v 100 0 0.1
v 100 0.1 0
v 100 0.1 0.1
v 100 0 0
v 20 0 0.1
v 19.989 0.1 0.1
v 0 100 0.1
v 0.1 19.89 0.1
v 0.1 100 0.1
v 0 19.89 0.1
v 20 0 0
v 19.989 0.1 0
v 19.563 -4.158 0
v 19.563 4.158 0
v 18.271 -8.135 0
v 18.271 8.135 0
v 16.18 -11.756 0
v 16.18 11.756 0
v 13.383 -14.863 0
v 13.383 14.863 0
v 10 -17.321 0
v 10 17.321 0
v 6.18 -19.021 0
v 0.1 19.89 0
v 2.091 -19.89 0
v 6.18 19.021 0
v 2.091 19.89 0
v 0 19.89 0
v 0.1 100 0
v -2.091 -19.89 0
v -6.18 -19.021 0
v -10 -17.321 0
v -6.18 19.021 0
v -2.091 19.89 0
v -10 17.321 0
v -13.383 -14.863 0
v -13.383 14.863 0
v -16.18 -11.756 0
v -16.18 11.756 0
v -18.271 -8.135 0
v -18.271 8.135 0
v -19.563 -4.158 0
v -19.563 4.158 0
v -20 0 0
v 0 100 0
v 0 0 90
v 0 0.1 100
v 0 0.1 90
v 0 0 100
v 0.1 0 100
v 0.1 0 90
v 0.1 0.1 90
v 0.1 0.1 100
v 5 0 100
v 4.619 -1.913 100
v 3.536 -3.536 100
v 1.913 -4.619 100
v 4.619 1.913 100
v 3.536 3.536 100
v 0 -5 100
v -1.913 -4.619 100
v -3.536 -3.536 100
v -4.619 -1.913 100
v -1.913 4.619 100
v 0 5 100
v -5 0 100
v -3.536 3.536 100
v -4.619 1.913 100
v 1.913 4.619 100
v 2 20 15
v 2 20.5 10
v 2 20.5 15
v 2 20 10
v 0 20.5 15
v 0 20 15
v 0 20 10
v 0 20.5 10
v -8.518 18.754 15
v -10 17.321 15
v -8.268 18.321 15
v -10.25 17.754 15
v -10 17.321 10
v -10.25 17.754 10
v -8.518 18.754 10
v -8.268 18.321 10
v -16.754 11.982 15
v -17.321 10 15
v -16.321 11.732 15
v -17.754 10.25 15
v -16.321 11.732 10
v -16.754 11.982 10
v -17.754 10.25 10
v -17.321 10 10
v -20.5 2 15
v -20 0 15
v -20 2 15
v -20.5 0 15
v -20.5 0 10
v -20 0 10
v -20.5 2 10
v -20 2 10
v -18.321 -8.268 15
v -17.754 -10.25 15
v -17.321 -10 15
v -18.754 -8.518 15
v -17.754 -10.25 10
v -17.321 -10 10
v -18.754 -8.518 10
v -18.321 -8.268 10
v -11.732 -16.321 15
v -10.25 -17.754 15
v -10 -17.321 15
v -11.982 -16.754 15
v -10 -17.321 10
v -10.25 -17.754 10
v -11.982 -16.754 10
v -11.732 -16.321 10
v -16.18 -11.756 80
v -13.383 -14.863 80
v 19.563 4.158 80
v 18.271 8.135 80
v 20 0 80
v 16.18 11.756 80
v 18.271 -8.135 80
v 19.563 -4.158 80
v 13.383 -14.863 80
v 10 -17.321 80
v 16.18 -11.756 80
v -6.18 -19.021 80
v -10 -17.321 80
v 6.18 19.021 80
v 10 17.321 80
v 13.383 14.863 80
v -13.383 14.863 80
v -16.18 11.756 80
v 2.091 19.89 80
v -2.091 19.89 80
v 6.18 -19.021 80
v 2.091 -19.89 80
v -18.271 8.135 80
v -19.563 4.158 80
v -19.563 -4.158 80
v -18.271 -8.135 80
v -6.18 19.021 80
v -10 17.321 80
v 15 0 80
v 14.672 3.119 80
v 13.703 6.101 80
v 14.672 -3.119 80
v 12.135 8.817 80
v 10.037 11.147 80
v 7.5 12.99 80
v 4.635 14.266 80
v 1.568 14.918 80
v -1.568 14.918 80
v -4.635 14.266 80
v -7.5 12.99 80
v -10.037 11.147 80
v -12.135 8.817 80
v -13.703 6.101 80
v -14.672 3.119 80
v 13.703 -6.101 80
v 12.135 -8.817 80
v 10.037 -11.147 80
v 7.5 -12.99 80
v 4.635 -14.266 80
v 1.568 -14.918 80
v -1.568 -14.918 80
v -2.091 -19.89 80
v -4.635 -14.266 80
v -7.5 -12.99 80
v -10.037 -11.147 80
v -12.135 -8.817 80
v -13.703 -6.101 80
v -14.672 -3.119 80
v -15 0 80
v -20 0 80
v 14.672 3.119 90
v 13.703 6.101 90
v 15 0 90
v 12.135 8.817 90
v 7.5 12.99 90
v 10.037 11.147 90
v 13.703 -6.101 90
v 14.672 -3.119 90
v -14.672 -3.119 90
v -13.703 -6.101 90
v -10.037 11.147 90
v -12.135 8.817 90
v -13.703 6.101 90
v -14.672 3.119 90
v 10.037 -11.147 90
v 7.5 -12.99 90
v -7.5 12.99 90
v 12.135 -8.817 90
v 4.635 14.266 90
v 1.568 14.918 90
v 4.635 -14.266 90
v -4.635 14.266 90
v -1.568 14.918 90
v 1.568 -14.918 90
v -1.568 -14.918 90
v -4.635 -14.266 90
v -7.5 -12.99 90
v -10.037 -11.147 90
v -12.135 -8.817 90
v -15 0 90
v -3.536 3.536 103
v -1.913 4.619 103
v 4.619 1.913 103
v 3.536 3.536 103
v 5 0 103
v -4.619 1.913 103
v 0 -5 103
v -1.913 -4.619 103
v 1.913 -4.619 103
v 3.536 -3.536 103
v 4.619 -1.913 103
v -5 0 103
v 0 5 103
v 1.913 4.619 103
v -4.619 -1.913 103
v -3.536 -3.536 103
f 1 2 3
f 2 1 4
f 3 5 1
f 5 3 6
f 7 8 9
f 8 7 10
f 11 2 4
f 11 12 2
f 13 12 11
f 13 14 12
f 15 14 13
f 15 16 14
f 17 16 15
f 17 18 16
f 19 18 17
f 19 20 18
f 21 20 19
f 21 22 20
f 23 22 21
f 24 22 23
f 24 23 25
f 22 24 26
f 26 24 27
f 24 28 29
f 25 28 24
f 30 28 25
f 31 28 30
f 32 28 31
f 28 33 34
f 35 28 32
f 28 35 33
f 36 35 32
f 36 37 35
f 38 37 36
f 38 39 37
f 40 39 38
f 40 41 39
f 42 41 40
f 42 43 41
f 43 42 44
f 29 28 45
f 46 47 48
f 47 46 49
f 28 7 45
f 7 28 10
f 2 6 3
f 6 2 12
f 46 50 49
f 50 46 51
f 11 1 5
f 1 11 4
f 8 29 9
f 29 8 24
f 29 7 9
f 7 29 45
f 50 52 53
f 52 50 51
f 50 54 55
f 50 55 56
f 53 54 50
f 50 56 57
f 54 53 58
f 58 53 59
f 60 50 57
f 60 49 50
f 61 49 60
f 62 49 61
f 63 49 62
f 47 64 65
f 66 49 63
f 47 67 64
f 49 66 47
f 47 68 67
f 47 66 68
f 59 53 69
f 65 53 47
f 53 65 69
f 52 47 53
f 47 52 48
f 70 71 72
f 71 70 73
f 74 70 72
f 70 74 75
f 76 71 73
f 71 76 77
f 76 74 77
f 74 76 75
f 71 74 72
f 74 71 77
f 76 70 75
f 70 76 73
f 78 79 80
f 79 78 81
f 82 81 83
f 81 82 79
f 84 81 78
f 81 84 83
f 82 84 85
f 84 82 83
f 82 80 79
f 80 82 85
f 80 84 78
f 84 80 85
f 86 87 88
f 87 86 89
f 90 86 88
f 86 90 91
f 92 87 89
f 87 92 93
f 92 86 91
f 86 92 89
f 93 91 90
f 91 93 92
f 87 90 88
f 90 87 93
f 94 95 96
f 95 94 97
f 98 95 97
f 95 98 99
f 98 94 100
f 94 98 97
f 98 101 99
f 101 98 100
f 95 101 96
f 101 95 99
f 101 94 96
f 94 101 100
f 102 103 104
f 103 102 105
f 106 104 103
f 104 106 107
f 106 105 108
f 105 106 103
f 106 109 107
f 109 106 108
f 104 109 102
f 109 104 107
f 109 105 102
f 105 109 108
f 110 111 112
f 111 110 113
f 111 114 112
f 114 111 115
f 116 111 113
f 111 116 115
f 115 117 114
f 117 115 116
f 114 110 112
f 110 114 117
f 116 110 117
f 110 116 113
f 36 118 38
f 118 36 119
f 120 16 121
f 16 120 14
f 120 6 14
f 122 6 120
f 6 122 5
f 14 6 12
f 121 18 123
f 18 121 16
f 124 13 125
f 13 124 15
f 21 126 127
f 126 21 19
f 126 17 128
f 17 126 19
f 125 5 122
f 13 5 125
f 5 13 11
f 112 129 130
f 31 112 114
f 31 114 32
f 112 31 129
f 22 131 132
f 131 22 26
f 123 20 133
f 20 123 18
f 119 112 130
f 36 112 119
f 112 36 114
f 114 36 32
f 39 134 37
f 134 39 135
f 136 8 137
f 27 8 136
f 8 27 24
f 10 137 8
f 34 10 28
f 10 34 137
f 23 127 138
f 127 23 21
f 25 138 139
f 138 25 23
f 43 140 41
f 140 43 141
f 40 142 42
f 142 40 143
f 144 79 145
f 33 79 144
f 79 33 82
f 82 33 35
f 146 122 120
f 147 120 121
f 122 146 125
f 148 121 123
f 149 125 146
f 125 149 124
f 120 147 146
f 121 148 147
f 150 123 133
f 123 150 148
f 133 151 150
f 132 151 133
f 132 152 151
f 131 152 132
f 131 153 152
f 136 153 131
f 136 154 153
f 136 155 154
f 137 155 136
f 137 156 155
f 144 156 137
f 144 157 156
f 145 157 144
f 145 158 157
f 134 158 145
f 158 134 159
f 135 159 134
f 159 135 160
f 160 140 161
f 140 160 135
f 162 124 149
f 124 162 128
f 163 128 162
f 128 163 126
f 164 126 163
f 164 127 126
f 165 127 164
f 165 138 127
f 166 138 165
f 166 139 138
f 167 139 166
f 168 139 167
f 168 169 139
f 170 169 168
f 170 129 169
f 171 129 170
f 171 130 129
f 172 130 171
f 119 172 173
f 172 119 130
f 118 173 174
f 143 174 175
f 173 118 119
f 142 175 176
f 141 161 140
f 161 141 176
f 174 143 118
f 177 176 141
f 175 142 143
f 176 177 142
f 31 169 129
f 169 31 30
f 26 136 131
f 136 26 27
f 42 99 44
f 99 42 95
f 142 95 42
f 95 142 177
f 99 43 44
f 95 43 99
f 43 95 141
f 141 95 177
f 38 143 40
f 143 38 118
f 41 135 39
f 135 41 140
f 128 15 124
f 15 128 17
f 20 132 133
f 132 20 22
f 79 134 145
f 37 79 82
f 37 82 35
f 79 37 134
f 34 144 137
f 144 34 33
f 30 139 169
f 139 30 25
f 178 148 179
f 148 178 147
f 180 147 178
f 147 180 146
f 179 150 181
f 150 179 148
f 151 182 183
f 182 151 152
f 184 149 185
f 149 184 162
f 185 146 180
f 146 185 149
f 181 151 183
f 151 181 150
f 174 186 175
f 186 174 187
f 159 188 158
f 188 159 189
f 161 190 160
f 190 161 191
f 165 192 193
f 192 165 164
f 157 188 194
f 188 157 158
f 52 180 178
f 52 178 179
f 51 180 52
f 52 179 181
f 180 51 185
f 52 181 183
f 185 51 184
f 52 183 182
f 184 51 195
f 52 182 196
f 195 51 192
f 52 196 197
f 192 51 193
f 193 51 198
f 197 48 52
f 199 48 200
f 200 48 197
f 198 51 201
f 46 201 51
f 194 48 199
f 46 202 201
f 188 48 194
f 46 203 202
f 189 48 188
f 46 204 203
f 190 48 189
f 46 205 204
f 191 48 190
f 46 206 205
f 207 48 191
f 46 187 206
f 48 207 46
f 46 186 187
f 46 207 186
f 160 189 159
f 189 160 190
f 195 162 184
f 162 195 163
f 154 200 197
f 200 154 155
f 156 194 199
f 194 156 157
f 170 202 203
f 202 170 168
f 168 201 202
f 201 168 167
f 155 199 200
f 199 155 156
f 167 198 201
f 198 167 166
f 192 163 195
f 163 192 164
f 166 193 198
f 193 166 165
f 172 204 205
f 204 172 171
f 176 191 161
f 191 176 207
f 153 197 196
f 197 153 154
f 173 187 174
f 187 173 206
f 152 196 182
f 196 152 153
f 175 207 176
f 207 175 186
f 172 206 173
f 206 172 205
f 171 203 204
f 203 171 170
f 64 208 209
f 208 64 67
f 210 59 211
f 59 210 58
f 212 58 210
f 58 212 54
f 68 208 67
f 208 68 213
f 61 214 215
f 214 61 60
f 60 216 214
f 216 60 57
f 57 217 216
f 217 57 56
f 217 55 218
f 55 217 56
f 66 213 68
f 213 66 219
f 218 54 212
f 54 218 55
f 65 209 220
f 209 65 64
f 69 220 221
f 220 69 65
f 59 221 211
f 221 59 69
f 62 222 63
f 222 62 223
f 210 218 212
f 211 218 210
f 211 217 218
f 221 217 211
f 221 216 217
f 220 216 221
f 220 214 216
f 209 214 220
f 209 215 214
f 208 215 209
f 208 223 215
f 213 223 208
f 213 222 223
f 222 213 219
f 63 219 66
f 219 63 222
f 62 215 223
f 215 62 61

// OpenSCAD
    // Combined Scene

    // Permanent Model
    
    // Permanent Model (Black)
    color([0, 0, 0]) {
        // Your permanent model code here
        cube([100,0.1,0.1], center = false);
        cube([0.1,100,0.1], center = false);
        cube([0.1,0.1,100], center = false);
    }
    

    // Dynamic Model
    cylinder(h = 80, r = 20); 
translate([0, 0, 80]) {
    scale([1, 1, 0.5]) {
        cylinder(h = 20, r = 15);
    }
}
translate([0, 0, 100]) {
    cylinder(h = 3, r = 5); 
}
translate([0, 0, 10]) {
    for (i = [0 : 5]) {
        rotate(i * 30) {
            translate([0, 20, 0]) {
                cube([2, 0.5, 5]);
            }
        }
    }
}
    
